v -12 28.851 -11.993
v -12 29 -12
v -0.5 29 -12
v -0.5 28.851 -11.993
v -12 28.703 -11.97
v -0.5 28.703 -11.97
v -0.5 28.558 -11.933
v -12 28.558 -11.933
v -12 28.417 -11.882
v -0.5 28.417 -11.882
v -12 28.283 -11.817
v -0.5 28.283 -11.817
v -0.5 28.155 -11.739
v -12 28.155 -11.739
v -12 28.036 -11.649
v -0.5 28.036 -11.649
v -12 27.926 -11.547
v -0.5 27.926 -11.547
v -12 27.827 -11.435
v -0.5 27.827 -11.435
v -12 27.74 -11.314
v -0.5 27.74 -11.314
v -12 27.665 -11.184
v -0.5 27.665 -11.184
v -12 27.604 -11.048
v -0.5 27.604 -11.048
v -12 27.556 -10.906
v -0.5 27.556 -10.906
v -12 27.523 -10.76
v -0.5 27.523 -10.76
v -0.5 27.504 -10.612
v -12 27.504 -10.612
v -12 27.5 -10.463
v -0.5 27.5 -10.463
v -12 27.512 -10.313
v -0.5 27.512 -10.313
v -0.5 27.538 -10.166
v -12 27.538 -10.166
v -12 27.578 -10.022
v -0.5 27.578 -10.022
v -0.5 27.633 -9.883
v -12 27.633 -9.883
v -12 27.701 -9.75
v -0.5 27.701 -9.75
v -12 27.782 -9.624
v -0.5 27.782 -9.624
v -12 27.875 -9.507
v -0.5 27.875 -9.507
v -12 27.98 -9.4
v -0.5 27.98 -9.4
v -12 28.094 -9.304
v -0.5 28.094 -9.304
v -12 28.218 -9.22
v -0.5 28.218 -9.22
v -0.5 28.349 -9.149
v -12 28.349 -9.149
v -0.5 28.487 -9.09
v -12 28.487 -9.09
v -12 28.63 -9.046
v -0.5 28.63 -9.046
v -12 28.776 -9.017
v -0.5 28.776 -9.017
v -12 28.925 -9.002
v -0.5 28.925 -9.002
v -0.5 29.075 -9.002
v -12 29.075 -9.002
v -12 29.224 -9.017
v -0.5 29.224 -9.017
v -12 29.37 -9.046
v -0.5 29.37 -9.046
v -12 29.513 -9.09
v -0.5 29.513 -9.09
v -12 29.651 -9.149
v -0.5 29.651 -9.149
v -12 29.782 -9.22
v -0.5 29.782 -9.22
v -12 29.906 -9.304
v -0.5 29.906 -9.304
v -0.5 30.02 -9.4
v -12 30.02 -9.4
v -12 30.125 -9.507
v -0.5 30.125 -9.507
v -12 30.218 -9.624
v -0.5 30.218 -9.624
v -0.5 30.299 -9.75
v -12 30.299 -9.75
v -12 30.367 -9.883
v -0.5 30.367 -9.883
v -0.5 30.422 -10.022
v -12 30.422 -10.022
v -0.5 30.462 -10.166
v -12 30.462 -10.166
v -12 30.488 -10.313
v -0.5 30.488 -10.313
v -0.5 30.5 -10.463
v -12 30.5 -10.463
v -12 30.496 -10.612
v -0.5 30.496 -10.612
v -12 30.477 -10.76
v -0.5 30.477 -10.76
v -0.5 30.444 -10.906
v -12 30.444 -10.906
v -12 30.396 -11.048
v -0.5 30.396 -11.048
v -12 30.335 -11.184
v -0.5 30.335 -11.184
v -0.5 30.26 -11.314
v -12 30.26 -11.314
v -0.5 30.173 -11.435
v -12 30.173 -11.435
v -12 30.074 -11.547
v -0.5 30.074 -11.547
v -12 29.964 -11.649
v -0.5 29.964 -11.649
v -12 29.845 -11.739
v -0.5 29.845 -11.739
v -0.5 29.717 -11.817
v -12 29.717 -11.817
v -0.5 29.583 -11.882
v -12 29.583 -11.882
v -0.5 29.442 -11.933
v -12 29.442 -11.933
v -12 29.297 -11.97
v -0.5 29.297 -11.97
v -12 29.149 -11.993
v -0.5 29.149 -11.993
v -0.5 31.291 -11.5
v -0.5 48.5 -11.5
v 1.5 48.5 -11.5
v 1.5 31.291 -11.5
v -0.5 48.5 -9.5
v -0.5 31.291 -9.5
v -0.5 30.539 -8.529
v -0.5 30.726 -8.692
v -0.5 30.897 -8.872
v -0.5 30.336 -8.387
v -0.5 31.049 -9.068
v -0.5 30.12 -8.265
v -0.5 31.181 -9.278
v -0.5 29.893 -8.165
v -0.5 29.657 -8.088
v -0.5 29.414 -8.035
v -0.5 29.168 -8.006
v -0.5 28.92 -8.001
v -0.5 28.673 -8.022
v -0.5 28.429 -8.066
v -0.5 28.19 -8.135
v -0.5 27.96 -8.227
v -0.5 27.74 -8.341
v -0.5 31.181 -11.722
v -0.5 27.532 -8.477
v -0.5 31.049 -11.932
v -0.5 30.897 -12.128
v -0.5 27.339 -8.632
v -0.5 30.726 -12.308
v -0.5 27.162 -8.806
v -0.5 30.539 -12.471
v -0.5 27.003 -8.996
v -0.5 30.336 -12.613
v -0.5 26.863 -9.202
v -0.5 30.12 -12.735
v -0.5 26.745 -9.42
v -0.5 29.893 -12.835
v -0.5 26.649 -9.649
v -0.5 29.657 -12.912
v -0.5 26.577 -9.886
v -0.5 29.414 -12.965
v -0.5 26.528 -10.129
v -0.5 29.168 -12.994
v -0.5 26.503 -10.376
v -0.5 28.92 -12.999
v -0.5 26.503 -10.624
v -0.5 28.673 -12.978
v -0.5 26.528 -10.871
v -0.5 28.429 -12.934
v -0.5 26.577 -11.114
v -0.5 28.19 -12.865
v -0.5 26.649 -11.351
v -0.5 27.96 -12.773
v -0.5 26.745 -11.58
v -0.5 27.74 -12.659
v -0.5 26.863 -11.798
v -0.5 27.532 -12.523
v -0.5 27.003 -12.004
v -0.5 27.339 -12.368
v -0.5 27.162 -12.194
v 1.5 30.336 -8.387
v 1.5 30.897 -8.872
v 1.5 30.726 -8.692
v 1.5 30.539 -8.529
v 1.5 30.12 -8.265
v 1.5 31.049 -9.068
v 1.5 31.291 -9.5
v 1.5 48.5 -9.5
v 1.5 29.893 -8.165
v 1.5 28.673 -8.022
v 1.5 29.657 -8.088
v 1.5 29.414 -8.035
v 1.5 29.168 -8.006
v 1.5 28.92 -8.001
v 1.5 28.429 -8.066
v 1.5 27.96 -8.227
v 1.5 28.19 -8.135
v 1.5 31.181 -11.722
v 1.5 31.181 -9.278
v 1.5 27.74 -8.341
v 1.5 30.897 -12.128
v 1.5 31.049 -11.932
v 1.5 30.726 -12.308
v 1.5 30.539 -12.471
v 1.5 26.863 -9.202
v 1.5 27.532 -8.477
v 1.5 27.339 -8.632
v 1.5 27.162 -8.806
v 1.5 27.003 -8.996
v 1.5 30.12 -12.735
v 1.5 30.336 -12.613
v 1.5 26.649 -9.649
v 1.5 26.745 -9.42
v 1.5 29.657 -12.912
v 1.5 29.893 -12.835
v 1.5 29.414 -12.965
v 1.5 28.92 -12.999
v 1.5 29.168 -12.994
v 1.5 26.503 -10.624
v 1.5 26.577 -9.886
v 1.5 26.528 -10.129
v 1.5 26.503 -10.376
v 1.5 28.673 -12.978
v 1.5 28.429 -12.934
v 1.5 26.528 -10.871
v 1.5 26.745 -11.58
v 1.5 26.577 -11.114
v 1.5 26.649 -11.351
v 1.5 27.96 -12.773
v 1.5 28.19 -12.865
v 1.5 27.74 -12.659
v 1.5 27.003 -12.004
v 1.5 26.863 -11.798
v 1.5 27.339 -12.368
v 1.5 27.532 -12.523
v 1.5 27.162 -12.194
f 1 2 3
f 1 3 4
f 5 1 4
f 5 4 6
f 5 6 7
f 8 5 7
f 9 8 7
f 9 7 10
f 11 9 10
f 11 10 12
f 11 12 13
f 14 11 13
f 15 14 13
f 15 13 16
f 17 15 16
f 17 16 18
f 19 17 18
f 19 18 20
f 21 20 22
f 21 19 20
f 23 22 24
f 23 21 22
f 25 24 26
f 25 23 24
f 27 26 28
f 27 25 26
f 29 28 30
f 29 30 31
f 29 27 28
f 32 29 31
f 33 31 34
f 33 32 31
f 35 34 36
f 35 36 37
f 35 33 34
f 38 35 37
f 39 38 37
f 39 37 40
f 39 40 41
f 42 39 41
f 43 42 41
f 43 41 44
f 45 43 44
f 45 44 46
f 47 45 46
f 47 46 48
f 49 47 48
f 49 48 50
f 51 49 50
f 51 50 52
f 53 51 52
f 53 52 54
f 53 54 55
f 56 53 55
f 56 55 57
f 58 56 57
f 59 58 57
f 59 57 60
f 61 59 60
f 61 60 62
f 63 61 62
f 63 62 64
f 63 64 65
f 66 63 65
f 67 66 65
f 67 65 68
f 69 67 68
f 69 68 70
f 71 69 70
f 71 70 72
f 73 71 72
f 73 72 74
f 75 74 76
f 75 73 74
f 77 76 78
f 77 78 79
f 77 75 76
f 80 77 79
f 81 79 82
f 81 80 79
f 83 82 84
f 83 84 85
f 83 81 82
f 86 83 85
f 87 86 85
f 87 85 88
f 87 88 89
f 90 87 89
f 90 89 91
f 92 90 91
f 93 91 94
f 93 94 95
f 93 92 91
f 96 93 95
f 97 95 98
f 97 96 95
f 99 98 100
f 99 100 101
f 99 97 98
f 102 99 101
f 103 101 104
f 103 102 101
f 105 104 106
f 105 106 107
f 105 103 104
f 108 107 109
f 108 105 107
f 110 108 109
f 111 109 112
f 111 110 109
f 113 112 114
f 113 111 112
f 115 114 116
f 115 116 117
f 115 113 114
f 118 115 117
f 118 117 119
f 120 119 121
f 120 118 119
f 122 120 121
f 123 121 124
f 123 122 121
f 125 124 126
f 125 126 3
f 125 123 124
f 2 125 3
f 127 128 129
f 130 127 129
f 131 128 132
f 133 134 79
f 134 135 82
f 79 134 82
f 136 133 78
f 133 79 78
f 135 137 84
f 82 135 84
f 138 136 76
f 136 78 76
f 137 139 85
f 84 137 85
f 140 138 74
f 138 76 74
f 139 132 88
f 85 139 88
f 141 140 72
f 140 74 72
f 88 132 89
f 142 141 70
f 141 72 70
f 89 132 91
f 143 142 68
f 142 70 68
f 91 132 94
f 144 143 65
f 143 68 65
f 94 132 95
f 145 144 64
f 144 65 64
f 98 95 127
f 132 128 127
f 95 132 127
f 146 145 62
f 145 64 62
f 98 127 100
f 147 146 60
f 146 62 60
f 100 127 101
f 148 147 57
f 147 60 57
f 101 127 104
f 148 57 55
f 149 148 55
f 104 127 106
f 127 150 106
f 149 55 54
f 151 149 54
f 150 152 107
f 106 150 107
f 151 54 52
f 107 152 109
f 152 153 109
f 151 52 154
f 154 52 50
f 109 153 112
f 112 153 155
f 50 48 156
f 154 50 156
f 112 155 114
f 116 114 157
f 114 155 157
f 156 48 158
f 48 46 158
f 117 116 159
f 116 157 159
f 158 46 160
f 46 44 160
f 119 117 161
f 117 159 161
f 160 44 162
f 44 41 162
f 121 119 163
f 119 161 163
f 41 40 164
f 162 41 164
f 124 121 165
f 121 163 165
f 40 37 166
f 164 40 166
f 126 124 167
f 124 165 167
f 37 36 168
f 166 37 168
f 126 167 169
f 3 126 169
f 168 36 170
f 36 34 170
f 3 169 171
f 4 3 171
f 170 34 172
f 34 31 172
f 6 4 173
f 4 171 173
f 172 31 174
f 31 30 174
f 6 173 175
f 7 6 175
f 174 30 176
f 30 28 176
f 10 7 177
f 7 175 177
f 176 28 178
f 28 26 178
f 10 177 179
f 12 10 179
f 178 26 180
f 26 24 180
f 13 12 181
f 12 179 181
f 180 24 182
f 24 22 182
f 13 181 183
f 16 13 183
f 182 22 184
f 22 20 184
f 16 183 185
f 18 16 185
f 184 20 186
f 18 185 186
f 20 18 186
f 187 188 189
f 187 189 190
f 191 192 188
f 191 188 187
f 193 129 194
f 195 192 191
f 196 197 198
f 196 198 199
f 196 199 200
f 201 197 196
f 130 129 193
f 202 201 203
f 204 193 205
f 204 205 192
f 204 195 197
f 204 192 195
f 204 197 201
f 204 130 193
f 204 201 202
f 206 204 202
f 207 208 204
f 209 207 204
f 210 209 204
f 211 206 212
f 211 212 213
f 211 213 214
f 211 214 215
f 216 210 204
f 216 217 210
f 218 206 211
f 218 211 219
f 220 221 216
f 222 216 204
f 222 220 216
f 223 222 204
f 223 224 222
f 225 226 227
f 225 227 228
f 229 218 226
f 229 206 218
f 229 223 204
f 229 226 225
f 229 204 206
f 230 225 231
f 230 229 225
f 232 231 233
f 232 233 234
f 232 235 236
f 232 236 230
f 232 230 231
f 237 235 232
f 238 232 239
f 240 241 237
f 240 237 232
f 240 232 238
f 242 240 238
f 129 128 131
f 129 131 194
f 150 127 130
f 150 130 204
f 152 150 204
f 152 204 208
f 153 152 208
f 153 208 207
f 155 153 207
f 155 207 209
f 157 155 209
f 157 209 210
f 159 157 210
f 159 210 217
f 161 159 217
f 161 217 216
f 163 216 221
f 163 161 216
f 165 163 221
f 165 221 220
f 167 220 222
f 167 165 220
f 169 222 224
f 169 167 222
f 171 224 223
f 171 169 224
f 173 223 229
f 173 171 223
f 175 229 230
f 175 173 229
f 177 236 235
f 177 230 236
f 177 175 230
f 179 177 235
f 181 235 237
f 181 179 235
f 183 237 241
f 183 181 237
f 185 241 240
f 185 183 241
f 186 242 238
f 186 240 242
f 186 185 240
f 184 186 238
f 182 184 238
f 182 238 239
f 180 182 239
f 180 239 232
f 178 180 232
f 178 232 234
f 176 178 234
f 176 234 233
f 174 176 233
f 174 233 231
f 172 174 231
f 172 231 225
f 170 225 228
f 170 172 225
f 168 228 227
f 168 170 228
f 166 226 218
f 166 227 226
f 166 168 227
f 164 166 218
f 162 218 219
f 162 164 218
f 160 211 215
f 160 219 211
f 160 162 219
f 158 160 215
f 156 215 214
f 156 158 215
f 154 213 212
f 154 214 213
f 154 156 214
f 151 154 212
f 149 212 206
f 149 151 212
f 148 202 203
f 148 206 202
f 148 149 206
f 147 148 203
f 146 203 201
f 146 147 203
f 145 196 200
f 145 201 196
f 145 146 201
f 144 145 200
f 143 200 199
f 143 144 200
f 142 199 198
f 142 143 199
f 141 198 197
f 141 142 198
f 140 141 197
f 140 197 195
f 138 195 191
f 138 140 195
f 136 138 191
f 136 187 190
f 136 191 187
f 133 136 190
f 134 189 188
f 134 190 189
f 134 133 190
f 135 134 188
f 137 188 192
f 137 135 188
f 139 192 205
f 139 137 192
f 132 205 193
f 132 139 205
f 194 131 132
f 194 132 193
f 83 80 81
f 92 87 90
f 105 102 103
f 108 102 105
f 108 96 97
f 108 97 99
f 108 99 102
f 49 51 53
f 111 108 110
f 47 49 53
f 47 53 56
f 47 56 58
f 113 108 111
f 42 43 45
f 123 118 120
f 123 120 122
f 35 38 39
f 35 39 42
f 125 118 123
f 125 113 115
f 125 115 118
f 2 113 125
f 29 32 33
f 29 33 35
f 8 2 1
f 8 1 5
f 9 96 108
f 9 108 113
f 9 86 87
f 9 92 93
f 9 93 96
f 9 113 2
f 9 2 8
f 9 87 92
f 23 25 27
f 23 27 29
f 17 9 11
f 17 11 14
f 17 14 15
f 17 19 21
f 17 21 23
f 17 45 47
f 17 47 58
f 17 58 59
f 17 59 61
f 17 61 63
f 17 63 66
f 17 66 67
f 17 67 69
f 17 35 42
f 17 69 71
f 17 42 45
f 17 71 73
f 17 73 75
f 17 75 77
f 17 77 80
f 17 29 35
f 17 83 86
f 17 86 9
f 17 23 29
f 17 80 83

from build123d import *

# Parameters (mm, degrees)
SERVICE_PIN_SHANK_SKETCH_R = 1.5
SERVICE_PIN_SHANK_DEPTH    = 11.5
SERVICE_PIN_HEAD_SKETCH_R  = 2.5
SERVICE_PIN_HEAD_DEPTH     = 2
LOCK_SWITCH_FLAG_SKETCH_W  = 2
LOCK_SWITCH_FLAG_SKETCH_H  = 19.5
LOCK_SWITCH_FLAG_DEPTH     = 2


with BuildPart() as part:
    # Service pin shank sketch → Service pin shank (new body)
    with BuildSketch(Plane(origin=(-12, 0, 0), x_dir=(0, 0, -1), z_dir=(1, 0, 0))):
        with Locations((10.5, -29)):
            Circle(SERVICE_PIN_SHANK_SKETCH_R)
    extrude(amount=SERVICE_PIN_SHANK_DEPTH)

    # Service pin head sketch → Service pin head (add)
    with BuildSketch(Plane(origin=(-0.5, 0, 0), x_dir=(0, 0, -1), z_dir=(1, 0, 0))):
        with Locations((10.5, -29)):
            Circle(SERVICE_PIN_HEAD_SKETCH_R)
    extrude(amount=SERVICE_PIN_HEAD_DEPTH)

    # Lock switch flag sketch → Lock switch flag (add)
    with BuildSketch(Plane.XY.offset(-11.5)):
        with Locations((0.5, -38.75)):
            Rectangle(LOCK_SWITCH_FLAG_SKETCH_W, LOCK_SWITCH_FLAG_SKETCH_H)
    extrude(amount=LOCK_SWITCH_FLAG_DEPTH)


with BuildPart() as body_2:
    # Mirror1: mirrored copy
    add(part.part.mirror(Plane(origin=(0, 0, 0), x_dir=(0, 0, 1), z_dir=(0, -1, 0))))


solid = body_2.part
